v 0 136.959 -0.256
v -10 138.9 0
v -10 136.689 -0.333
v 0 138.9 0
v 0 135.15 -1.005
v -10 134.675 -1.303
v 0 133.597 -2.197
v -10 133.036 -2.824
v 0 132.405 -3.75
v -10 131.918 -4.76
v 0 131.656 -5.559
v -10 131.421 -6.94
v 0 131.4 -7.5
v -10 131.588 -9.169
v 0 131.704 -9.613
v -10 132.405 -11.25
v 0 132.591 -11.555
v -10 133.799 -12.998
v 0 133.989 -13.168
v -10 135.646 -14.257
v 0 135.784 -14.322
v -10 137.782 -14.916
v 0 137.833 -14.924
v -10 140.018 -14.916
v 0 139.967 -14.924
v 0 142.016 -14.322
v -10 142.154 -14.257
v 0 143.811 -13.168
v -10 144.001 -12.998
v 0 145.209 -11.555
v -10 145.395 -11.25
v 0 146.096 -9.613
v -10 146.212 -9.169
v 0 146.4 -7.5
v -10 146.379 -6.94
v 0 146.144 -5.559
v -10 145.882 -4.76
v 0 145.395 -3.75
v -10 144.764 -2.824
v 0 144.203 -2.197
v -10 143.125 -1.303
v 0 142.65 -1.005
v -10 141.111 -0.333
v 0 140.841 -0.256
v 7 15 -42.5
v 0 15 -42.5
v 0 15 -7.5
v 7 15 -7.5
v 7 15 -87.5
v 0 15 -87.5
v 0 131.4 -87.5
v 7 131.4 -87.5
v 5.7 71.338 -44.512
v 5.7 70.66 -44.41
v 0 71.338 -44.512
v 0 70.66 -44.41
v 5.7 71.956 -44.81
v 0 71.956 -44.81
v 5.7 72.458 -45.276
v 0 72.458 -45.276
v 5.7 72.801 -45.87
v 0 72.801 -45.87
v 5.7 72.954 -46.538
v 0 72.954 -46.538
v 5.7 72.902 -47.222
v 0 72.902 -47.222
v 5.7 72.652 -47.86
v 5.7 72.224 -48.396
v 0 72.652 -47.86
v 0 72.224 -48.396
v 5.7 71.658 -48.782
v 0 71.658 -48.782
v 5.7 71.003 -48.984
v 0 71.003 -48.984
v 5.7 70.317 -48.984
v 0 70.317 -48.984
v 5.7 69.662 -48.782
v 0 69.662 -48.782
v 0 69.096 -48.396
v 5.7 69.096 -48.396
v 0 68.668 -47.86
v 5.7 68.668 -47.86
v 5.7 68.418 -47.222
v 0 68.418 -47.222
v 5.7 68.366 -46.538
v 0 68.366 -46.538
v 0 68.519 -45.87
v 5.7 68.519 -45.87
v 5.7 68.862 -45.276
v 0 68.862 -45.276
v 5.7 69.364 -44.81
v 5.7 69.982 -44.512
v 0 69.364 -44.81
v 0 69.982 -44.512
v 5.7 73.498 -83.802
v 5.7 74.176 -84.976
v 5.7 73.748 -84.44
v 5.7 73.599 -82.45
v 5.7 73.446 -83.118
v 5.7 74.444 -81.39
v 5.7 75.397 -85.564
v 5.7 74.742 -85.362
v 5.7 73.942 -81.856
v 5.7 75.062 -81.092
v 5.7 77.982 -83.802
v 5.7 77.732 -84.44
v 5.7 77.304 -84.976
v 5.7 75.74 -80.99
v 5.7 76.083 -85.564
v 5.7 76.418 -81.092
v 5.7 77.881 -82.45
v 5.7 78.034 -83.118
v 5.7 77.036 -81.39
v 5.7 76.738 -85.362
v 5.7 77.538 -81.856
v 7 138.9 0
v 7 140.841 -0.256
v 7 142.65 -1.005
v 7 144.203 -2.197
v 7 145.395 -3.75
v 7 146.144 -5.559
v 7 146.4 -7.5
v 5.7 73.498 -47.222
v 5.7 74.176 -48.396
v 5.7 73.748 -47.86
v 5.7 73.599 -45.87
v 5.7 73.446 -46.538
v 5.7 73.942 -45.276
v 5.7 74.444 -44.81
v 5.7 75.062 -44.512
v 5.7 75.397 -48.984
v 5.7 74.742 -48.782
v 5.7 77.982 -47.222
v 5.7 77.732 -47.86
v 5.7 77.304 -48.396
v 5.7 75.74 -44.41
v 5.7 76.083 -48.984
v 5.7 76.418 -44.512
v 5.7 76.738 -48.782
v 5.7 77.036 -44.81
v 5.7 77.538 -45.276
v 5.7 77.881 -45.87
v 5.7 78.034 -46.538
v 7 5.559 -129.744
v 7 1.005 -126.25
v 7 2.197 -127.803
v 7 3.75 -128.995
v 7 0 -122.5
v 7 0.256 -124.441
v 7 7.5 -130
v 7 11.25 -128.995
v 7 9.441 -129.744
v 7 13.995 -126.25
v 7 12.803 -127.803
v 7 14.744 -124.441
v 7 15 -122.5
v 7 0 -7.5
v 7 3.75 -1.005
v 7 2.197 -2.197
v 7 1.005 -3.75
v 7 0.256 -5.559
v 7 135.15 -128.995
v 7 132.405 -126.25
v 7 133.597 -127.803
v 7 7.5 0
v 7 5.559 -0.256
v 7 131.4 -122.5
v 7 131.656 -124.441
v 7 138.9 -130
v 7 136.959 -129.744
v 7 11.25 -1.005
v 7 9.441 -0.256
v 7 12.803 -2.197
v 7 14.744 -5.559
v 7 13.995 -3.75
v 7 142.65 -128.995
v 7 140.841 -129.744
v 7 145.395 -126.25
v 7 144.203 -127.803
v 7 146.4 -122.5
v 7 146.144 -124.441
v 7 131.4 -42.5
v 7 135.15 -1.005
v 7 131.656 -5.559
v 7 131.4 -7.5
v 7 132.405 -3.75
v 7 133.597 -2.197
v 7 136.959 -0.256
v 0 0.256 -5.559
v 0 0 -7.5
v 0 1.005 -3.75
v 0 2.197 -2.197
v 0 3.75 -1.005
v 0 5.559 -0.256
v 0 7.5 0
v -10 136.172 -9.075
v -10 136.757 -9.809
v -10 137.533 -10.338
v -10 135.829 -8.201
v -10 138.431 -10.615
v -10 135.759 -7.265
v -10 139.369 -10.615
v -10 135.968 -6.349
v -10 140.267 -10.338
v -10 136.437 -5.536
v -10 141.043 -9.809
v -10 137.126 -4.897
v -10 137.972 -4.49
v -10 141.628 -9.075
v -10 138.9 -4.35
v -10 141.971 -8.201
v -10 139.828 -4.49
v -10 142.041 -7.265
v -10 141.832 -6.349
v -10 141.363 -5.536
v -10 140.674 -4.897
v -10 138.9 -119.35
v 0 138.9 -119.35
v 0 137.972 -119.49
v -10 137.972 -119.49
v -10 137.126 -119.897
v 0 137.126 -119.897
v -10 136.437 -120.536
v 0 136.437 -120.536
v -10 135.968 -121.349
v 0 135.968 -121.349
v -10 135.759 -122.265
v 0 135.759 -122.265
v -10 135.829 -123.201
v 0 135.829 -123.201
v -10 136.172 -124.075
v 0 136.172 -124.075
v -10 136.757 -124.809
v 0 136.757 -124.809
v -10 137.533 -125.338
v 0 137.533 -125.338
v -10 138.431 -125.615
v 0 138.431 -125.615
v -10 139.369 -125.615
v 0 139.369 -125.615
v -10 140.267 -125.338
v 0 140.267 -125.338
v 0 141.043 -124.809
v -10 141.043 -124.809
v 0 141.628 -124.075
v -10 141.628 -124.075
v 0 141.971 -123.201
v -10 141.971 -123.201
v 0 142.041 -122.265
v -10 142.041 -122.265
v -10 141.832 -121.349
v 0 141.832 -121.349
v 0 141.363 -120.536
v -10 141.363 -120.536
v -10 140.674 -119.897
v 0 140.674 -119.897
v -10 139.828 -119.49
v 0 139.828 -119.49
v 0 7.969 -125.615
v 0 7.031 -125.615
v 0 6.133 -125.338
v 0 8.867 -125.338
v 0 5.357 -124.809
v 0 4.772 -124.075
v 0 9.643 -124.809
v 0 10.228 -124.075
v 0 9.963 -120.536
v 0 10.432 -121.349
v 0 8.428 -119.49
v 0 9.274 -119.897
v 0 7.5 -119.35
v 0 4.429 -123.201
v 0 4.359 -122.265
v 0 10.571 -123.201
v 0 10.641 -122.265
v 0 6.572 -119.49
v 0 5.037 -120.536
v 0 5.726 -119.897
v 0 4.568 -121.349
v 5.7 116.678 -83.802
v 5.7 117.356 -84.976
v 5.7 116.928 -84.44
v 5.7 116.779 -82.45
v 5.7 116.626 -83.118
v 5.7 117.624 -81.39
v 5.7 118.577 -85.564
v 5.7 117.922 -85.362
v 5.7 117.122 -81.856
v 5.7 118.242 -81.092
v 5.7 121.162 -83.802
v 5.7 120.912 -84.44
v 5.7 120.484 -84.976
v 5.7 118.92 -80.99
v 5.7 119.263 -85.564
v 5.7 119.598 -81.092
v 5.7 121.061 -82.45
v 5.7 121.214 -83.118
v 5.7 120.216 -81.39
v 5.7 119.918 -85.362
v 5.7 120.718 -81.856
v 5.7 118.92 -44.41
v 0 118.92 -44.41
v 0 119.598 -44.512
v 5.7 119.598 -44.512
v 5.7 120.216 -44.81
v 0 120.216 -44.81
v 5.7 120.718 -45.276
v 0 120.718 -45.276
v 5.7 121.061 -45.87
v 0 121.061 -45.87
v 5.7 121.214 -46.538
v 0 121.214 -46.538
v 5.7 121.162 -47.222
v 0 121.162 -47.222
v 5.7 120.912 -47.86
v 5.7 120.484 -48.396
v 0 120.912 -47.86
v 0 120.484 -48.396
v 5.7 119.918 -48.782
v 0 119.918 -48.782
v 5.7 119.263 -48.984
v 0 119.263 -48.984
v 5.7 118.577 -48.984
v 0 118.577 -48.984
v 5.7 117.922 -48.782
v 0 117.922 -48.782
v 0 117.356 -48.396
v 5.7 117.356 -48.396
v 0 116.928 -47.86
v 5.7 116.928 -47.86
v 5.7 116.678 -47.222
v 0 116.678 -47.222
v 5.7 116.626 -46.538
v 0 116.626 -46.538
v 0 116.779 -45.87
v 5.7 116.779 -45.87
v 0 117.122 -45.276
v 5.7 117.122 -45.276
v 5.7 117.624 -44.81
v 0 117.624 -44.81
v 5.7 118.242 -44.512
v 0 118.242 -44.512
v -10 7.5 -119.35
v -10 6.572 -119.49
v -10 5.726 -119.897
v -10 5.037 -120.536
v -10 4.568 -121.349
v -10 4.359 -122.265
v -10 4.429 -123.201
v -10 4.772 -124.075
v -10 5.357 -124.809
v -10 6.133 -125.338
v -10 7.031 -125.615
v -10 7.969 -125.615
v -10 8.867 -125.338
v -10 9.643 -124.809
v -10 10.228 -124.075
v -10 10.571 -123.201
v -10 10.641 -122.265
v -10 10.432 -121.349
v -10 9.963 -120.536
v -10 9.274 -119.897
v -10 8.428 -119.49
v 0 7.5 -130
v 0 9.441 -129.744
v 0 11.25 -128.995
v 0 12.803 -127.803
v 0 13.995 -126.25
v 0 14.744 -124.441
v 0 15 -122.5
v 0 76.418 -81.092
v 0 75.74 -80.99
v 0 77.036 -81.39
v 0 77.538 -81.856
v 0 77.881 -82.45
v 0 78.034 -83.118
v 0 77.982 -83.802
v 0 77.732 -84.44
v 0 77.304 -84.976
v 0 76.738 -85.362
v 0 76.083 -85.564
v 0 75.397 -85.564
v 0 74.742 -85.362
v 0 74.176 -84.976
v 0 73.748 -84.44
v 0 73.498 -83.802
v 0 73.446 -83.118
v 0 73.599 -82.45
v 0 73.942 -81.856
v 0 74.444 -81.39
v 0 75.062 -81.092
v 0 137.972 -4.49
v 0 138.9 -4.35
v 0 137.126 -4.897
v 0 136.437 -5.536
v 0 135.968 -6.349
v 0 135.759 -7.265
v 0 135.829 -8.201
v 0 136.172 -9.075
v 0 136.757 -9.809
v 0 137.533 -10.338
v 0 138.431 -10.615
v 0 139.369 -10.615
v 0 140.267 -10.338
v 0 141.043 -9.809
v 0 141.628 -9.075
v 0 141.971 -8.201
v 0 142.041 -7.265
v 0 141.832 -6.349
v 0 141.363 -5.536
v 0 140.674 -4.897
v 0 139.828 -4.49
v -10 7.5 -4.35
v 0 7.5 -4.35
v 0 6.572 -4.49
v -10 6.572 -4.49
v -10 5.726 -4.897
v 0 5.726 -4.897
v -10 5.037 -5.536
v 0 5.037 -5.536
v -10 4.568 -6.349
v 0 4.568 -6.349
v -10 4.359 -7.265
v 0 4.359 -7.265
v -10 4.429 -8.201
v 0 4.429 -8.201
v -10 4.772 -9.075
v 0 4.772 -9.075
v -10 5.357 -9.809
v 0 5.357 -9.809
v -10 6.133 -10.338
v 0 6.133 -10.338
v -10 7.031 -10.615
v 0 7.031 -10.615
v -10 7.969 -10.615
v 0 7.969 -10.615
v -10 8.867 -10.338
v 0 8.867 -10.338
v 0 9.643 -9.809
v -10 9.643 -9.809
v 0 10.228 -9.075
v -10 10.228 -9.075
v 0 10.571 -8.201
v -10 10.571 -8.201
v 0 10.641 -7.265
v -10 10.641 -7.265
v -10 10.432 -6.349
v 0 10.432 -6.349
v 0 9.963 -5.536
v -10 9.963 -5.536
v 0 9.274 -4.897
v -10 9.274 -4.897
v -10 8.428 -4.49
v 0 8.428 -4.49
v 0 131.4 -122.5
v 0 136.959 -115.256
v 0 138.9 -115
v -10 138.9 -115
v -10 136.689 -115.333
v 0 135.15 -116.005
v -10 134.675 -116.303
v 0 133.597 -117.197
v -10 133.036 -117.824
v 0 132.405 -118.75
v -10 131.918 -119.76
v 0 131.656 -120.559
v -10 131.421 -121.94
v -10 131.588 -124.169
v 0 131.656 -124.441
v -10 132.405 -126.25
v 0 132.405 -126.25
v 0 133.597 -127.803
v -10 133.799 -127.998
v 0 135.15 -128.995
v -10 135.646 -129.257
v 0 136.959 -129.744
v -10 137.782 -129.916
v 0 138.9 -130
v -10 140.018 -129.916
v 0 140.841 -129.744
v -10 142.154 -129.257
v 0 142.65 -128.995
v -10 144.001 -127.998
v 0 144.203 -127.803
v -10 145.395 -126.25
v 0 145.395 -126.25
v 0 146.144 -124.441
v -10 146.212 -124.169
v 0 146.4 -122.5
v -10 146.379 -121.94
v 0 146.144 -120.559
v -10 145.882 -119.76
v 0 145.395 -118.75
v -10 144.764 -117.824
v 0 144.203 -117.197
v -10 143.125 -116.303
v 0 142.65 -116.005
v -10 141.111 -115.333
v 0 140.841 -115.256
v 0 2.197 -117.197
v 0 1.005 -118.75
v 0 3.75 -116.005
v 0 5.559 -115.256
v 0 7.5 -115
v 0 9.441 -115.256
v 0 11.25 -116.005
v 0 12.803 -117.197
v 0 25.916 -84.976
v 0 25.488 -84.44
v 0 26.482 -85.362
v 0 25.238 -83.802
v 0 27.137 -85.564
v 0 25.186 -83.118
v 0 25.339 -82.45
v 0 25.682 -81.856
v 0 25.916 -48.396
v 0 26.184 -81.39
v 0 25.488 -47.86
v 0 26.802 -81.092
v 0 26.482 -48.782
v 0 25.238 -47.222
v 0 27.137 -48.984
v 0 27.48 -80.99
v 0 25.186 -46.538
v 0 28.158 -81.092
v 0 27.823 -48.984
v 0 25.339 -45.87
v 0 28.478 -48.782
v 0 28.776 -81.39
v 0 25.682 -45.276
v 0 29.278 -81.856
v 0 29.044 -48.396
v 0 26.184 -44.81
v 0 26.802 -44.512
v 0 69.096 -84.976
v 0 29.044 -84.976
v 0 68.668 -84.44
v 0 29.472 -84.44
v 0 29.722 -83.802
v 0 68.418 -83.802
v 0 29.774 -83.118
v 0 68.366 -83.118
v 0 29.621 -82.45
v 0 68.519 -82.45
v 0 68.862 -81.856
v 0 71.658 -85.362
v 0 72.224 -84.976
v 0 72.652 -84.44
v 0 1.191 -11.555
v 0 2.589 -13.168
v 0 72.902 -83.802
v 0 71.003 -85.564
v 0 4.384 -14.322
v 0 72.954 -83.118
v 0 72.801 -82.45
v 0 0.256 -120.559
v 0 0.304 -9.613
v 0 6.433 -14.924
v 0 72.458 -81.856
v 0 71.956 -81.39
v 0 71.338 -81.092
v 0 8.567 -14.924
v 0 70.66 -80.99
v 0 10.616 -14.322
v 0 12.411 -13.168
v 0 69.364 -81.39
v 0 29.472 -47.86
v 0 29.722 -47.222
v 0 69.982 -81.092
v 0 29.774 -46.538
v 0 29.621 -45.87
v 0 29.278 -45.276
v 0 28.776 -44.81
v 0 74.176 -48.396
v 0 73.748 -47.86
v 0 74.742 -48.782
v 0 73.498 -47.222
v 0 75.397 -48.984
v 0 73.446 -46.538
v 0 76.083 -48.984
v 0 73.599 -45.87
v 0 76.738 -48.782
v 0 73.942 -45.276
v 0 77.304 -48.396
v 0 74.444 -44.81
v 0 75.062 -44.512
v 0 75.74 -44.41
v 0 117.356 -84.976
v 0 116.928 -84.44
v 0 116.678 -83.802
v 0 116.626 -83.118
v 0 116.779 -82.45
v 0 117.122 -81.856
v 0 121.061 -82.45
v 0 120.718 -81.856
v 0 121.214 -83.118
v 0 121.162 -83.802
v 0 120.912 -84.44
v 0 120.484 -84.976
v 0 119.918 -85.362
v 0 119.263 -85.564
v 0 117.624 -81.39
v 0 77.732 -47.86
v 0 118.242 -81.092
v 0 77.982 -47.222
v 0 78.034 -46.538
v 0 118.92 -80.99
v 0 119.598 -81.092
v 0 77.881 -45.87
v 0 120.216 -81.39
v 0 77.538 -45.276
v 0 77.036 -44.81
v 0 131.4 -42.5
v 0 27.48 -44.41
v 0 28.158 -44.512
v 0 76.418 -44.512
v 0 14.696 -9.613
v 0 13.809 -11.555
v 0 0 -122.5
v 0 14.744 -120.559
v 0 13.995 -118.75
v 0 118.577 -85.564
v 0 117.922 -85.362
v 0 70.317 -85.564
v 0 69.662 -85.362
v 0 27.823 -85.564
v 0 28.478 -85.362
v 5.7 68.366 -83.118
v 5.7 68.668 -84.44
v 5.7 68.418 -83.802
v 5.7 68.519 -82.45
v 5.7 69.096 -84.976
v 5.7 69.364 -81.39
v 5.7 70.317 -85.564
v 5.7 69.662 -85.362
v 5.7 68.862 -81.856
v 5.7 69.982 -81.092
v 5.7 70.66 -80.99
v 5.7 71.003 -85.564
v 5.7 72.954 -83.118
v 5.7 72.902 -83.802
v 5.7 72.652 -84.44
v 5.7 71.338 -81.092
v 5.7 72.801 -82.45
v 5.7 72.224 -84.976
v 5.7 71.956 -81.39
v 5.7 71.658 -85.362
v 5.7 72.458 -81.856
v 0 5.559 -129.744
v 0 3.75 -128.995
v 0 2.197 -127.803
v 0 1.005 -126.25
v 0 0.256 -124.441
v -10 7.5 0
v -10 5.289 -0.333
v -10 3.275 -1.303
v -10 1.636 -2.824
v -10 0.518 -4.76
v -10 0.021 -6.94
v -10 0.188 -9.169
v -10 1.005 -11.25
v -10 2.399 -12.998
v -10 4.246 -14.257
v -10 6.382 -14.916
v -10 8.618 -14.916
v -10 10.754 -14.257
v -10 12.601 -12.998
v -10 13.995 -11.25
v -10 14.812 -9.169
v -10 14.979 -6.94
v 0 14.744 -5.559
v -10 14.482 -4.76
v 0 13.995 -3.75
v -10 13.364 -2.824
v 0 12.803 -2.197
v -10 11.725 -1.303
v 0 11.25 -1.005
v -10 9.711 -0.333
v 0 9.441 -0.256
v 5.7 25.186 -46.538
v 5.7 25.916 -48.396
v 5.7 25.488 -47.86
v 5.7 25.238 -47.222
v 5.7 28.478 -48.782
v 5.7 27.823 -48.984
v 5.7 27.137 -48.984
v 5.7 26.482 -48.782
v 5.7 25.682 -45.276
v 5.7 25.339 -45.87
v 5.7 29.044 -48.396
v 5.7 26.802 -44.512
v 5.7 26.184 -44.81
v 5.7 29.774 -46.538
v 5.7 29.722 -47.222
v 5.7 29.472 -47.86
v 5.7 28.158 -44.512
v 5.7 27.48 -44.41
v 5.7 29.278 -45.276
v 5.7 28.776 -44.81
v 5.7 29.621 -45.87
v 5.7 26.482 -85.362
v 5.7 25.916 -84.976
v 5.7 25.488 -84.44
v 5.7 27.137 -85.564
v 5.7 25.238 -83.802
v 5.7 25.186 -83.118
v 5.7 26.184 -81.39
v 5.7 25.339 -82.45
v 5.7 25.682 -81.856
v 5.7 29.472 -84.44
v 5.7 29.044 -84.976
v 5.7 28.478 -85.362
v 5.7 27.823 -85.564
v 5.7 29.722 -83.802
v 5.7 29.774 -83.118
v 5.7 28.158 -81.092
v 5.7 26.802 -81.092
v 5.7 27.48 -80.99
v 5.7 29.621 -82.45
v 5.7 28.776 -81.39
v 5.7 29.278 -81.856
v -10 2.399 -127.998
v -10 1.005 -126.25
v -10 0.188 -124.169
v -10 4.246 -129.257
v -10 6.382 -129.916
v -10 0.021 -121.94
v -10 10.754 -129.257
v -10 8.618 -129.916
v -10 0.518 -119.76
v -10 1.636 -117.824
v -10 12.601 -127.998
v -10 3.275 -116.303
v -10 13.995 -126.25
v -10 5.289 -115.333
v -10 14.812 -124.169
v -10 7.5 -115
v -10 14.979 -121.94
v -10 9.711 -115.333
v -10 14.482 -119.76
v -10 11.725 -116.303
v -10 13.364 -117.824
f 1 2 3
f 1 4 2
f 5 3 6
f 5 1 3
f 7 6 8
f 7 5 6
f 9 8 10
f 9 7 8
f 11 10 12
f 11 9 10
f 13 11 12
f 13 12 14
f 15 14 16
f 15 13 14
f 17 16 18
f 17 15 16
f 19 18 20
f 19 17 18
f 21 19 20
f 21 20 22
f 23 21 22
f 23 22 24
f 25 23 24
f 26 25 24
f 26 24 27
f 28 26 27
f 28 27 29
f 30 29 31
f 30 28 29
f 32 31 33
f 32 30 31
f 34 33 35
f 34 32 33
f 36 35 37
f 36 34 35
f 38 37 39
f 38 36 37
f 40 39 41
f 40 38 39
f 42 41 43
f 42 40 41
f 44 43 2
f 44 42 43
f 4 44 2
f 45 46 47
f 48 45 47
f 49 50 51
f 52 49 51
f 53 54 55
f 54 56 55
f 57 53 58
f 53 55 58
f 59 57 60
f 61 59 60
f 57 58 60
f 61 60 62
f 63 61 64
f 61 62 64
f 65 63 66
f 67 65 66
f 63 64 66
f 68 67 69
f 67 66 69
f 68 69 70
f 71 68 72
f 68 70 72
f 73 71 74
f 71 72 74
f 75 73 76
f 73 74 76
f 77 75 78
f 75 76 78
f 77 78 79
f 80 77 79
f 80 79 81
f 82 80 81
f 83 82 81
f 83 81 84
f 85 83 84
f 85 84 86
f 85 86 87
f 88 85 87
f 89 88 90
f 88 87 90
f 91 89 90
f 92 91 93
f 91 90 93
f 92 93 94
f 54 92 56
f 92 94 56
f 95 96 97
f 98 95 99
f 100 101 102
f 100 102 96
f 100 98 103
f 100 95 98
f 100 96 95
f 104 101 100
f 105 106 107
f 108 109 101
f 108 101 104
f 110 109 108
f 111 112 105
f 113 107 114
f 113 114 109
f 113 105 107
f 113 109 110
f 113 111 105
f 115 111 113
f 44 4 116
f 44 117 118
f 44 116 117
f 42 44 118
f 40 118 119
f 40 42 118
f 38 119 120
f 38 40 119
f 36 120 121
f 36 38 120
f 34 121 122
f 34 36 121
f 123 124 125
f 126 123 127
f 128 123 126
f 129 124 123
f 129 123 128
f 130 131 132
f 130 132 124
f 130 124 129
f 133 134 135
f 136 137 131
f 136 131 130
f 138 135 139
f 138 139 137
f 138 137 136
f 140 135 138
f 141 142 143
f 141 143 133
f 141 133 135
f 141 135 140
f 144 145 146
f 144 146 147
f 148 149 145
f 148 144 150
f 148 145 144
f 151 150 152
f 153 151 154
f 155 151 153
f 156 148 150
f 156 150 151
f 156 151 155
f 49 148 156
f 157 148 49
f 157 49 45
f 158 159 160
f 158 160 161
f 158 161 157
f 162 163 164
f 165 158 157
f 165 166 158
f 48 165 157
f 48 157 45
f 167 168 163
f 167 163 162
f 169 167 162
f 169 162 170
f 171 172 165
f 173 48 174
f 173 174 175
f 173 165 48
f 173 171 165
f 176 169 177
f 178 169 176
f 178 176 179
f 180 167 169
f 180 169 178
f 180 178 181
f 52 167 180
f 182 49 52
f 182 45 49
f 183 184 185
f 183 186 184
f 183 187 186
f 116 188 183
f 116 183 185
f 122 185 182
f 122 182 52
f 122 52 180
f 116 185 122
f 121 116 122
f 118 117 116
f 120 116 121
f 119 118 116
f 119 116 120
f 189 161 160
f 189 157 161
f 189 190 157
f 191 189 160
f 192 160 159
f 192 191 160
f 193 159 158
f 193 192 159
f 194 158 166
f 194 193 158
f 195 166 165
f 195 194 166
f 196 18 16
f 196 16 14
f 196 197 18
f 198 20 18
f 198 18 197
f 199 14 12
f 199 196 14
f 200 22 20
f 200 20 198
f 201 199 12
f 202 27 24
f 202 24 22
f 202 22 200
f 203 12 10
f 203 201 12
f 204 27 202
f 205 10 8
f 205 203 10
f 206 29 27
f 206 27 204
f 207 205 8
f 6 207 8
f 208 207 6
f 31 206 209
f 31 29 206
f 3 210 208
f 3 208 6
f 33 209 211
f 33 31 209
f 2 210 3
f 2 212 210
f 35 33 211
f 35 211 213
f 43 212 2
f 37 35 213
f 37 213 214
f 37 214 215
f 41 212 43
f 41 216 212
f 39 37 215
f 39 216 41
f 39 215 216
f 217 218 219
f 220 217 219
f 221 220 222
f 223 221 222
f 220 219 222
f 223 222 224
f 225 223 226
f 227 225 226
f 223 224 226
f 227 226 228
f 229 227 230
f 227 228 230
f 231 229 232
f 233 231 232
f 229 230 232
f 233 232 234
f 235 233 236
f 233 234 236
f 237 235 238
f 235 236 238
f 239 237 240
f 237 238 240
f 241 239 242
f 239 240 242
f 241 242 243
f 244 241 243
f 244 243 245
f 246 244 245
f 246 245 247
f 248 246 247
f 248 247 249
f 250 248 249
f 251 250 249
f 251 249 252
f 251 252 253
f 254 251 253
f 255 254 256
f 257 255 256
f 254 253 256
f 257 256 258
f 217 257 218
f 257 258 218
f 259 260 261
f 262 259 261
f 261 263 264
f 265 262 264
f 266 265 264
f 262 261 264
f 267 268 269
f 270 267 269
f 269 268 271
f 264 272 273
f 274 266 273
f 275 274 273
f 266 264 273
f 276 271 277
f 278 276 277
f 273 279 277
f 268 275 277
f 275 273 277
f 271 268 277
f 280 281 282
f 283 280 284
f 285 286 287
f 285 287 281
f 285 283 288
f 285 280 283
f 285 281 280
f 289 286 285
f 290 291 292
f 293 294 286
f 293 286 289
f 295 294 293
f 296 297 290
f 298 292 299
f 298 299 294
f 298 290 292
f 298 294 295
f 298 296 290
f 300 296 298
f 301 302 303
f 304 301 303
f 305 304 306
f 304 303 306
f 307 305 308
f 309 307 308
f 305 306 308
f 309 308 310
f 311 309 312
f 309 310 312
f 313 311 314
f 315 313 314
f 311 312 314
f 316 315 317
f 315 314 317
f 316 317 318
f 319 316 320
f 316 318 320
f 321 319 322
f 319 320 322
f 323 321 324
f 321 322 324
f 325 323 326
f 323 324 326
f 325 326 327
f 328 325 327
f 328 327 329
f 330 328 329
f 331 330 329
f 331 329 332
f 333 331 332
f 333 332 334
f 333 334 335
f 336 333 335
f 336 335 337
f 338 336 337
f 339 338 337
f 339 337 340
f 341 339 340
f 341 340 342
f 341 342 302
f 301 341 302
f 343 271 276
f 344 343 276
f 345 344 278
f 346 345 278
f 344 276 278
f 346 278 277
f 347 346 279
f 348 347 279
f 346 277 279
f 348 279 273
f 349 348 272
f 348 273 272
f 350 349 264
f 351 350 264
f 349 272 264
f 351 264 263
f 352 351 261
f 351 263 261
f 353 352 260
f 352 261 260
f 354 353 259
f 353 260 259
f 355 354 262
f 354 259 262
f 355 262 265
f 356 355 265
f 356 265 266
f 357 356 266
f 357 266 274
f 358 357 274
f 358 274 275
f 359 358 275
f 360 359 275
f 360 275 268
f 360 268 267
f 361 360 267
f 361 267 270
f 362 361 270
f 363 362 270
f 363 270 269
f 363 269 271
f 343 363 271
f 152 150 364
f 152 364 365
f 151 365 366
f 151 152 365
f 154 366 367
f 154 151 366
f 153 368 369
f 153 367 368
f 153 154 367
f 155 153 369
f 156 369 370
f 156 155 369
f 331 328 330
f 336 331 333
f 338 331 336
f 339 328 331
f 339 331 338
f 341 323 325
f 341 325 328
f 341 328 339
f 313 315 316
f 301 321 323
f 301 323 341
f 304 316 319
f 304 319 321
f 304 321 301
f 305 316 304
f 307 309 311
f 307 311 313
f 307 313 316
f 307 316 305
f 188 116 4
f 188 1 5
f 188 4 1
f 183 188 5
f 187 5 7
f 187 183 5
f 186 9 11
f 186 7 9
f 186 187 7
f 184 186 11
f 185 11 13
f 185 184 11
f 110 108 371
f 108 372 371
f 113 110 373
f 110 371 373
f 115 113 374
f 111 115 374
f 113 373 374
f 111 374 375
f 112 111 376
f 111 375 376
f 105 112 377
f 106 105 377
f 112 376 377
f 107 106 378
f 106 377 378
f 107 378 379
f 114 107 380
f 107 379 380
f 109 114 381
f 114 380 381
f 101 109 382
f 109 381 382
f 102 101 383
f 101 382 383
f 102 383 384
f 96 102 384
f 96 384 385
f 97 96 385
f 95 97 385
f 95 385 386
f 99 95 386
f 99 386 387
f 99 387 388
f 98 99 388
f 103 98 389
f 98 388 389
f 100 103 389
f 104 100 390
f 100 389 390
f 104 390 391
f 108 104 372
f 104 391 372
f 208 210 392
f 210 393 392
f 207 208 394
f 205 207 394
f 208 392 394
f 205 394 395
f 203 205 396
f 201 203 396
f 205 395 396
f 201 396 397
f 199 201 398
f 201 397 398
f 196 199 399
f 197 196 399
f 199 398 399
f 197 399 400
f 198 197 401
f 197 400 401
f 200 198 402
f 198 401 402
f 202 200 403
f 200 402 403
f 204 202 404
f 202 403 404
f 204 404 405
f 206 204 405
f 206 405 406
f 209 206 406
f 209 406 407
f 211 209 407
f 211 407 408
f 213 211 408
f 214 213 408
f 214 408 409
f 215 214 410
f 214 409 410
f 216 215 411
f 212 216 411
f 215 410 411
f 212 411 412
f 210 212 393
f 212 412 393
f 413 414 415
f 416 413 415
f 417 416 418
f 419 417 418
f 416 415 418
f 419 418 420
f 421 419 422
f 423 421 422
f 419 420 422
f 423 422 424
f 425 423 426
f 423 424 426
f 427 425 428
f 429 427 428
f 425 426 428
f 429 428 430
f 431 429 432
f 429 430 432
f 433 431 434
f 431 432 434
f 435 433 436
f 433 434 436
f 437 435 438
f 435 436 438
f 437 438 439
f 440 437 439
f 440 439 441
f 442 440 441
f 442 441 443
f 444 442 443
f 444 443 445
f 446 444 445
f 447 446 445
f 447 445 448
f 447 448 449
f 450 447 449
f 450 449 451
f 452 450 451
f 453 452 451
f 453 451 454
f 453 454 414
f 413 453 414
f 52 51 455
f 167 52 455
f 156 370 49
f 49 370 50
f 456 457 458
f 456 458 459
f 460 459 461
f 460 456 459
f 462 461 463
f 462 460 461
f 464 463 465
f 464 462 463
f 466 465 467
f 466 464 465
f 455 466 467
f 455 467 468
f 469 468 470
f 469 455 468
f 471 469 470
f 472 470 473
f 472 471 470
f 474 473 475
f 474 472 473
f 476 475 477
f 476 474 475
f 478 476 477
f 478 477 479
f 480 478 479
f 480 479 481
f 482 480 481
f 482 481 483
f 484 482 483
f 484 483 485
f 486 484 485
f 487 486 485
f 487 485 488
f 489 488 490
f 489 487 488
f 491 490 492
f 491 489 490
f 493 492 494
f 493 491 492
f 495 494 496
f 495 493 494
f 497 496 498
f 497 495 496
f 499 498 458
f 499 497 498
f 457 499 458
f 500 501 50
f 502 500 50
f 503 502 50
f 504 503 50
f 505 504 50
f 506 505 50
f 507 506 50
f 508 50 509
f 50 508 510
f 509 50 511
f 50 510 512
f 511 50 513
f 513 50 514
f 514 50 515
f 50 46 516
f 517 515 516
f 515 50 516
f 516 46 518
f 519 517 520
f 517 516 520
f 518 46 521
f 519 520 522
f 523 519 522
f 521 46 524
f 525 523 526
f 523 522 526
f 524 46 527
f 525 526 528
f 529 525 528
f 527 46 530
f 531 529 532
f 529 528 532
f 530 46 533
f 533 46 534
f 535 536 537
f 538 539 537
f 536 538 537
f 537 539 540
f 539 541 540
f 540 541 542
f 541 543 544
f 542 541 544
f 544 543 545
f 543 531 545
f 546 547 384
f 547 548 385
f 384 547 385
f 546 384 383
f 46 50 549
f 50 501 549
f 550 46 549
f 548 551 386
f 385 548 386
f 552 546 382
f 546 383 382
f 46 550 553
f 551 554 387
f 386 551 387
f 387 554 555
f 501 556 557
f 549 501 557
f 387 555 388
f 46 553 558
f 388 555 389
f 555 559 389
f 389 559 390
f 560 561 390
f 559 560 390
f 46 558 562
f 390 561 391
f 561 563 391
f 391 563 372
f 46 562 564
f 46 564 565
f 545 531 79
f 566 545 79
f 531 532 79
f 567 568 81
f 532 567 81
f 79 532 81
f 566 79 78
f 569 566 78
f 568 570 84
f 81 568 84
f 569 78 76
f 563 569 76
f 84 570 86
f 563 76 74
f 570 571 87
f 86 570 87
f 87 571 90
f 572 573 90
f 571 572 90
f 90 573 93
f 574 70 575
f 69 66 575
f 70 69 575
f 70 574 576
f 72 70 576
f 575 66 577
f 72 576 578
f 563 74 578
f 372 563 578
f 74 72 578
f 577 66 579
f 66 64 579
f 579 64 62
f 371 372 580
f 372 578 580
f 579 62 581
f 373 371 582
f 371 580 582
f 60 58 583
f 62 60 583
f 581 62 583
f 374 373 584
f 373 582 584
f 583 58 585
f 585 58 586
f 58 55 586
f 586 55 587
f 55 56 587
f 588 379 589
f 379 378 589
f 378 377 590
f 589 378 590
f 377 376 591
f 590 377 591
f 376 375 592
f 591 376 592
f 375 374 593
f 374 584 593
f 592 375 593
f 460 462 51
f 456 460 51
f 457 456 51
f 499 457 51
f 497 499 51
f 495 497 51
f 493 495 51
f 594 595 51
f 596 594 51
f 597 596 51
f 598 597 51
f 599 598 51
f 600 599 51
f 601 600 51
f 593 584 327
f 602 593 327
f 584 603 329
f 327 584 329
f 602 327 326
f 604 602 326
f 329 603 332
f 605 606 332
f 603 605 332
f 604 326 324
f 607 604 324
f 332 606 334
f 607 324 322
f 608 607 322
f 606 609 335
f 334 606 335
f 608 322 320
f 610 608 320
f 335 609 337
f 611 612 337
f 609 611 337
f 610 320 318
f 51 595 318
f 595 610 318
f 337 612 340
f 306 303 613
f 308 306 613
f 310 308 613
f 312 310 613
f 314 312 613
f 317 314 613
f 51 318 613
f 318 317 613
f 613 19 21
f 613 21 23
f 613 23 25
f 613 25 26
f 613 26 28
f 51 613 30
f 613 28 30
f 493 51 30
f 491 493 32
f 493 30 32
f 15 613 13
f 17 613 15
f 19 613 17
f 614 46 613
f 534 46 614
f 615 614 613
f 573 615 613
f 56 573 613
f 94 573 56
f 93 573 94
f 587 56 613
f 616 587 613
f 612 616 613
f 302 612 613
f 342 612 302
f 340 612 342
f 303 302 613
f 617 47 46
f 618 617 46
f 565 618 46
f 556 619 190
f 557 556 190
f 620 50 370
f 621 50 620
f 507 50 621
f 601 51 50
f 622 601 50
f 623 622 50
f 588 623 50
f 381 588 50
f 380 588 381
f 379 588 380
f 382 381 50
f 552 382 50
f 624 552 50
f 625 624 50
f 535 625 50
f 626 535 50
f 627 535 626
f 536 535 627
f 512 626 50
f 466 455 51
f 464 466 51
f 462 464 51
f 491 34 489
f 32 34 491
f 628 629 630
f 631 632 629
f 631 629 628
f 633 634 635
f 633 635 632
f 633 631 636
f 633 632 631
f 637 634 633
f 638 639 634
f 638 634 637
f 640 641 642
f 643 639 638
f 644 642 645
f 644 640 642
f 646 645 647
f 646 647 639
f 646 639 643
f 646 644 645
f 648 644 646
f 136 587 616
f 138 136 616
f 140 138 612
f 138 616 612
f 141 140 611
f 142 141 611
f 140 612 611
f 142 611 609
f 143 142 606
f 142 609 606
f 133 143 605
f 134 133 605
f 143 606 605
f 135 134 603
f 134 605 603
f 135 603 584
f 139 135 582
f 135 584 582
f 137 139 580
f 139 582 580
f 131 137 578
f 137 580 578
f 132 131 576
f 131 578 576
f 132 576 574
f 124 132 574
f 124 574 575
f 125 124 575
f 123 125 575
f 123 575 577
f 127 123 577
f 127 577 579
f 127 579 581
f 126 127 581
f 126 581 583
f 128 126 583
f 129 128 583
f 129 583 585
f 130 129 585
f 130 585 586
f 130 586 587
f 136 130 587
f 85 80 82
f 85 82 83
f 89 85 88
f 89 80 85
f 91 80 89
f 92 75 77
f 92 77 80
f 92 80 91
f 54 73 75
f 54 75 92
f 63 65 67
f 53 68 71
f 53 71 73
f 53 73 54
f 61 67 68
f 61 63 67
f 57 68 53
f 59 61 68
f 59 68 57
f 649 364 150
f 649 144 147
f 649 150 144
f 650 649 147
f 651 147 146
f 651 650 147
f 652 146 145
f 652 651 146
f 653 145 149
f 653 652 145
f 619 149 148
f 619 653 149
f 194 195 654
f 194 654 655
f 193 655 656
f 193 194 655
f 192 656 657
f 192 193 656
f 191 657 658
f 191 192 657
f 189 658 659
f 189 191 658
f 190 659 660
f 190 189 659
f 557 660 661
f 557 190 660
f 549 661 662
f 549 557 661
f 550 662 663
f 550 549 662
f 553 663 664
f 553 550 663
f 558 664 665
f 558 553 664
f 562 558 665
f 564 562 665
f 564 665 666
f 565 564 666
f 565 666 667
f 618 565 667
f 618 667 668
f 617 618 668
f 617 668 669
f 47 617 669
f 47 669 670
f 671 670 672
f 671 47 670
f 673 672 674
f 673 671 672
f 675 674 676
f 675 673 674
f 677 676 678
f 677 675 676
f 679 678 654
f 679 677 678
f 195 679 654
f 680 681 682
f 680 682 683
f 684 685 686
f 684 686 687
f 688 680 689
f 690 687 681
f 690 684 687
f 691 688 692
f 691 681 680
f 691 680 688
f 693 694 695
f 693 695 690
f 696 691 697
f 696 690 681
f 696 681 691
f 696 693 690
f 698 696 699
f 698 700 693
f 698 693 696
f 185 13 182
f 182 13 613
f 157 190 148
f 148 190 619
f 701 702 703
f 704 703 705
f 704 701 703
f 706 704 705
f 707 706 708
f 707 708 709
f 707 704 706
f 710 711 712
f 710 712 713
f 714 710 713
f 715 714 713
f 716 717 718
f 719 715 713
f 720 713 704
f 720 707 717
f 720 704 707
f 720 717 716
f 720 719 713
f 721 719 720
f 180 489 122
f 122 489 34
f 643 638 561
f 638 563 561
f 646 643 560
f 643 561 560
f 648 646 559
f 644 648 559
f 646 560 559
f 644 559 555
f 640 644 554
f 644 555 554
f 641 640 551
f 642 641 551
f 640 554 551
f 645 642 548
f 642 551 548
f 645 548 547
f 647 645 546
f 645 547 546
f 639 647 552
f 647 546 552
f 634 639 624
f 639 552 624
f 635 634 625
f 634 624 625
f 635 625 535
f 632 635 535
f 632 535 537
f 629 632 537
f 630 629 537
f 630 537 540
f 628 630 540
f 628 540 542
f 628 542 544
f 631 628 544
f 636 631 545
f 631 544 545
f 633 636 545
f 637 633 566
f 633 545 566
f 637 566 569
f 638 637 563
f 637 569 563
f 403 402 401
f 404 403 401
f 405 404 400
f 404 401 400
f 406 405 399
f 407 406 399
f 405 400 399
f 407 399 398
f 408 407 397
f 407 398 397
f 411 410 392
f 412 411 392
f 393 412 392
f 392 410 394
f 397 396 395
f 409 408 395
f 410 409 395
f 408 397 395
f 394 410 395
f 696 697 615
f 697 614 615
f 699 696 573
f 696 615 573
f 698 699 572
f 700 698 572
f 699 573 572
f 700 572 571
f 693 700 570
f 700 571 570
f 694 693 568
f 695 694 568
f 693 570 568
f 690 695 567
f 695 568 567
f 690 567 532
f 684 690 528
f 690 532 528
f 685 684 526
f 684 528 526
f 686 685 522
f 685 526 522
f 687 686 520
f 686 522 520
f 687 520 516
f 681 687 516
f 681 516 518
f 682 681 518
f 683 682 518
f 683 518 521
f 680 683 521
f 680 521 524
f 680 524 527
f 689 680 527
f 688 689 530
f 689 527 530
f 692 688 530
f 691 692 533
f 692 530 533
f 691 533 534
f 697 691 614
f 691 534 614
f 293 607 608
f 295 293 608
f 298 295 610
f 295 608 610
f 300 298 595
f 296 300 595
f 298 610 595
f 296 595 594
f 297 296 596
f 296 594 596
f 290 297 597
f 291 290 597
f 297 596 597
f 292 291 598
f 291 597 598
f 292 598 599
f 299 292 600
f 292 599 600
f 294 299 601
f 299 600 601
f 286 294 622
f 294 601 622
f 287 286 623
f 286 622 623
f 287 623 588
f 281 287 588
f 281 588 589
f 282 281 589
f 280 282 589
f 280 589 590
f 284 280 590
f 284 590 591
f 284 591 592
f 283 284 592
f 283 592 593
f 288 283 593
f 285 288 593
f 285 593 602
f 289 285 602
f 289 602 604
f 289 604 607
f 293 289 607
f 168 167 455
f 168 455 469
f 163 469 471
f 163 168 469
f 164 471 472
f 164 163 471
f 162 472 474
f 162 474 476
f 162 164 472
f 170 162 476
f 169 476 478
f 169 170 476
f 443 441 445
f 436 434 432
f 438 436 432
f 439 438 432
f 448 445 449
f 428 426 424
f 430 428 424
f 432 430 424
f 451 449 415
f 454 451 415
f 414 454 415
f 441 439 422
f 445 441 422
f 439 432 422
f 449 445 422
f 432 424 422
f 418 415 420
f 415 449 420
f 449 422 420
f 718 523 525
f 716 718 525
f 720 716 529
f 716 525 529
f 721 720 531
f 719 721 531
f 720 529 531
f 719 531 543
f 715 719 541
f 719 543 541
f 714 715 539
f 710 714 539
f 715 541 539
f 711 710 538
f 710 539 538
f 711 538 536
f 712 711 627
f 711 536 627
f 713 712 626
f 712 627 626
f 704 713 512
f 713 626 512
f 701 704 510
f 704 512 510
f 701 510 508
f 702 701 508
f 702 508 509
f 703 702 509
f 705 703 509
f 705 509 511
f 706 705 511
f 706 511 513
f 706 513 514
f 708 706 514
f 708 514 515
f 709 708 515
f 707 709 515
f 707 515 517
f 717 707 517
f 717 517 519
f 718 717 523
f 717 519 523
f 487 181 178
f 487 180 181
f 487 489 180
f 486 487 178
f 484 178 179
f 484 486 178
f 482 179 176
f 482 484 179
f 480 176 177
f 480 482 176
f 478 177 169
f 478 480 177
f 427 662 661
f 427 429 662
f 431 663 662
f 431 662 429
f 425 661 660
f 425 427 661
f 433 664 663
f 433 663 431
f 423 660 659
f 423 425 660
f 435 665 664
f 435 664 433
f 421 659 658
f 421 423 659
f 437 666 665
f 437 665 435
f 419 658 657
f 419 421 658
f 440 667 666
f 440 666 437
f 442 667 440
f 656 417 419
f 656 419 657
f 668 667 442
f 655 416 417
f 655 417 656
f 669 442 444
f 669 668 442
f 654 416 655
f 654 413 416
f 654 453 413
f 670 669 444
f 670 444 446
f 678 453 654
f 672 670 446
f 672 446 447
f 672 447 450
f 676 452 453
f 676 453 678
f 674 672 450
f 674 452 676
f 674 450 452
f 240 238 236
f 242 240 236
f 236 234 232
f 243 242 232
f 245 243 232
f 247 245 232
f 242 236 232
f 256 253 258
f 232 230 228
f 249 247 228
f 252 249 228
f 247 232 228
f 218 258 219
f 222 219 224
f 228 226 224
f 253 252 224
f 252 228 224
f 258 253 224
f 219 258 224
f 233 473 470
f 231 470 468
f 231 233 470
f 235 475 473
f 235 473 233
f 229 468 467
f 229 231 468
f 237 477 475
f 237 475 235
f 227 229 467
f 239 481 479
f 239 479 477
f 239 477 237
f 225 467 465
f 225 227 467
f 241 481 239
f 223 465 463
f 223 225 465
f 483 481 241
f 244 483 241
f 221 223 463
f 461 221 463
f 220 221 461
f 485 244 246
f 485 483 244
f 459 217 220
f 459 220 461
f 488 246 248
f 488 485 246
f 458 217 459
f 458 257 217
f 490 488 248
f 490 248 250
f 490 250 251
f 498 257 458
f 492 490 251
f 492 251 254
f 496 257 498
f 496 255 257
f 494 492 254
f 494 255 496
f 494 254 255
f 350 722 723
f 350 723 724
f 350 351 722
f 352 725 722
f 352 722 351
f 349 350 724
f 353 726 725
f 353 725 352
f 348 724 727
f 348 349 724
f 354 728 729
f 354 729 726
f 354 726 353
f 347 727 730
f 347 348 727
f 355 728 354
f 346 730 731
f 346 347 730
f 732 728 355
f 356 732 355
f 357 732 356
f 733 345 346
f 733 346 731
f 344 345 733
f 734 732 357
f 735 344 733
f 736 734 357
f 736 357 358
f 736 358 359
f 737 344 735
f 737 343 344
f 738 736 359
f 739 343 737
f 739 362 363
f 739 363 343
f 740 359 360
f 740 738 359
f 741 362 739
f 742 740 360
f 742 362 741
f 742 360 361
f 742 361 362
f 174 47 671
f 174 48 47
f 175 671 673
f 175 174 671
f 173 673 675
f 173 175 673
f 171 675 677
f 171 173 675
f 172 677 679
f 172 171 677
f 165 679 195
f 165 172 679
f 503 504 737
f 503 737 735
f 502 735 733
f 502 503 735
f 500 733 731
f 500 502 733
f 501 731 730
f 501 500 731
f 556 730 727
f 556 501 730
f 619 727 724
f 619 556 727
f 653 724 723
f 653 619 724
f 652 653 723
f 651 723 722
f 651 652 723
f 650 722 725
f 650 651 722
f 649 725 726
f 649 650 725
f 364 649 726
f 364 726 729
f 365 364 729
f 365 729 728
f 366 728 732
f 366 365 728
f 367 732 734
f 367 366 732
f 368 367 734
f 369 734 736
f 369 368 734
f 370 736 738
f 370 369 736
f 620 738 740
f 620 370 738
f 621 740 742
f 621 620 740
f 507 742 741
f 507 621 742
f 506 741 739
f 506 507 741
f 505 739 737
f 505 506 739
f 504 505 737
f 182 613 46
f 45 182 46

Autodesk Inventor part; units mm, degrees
ref_plane "YZ Plane" through (0, 0, 0) normal (1, 0, 0) x (0, 1, 0)
ref_plane "XZ Plane" through (0, 0, 0) normal (0, 1, 0) x (-1, 0, 0)
ref_plane "XY Plane" through (0, 0, 0) normal (0, 0, 1) x (1, 0, 0)
sketch "Esquisse1" plane through (0, 0, 0) normal (1, 0, 0) x (0, 1, 0)
  line L0 (7.5, 0) -> (138.9, 0)
  line L1 (146.4, -7.5) -> (146.4, -122.5)
  line L2 (138.9, -130) -> (7.5, -130)
  line L3 (0, -122.5) -> (0, -7.5)
  arc A0 (138.9, -130) -> (146.4, -122.5) centre (138.9, -122.5) ccw
  arc A1 (0, -122.5) -> (7.5, -130) centre (7.5, -122.5) ccw
  arc A2 (7.5, 0) -> (0, -7.5) centre (7.5, -7.5) ccw
  arc A3 (146.4, -7.5) -> (138.9, 0) centre (138.9, -7.5) ccw
  line L4 (15, -42.5) -> (131.4, -42.5)
  line L5 (131.4, -42.5) -> (131.4, -87.5)
  line L6 (131.4, -87.5) -> (15, -87.5)
  line L7 (15, -87.5) -> (15, -42.5)
  circle A4 centre (138.9, -122.5) radius 7.5
  line L8 (15, -42.5) -> (15, 0)
  line L9 (15, -87.5) -> (15, -130)
  line L10 (131.4, -87.5) -> (131.4, -130)
  line L11 (131.4, -42.5) -> (131.4, 0)
  circle A5 centre (7.5, -122.5) radius 7.5
  circle A6 centre (138.9, -7.5) radius 7.5
  circle A7 centre (7.5, -7.5) radius 7.5
  point P0 (0, 0)
  point P1 (146.4, -130)
  point P2 (146.4, 0)
  point P3 (0, -130)
  point P4 (73.2, -87.5)
  dimension "d0" = 146.4
  dimension "d1" = 130
  dimension "d2" = 7.5
  dimension "d3" = 7.5
  dimension "d4" = 116.4
  dimension "d5" = 45
  dimension "d11" = 42.5
  dimension "d12" = 42.5
  dimension "d13" = 15
  dimension "d104" = 131.4
  dimension "d107" = 115
sketch "Esquisse1 outline for Extrusion1" plane through (0, 0, 0) normal (1, 0, 0) x (0, 1, 0)
  line L0 (15, -87.5) -> (131.4, -87.5)
  line L1 (15, -130) -> (15, -87.5)
  line L2 (7.5, -130) -> (15, -130)
  arc A0 (0, -122.5) -> (7.5, -130) centre (7.5, -122.5) ccw
  line L3 (0, -7.5) -> (0, -122.5)
  arc A1 (7.5, 0) -> (0, -7.5) centre (7.5, -7.5) ccw
  line L4 (15, 0) -> (7.5, 0)
  line L5 (15, -42.5) -> (15, 0)
  line L6 (131.4, -42.5) -> (15, -42.5)
  line L7 (131.4, 0) -> (131.4, -42.5)
  line L8 (138.9, 0) -> (131.4, 0)
  arc A2 (146.4, -7.5) -> (138.9, 0) centre (138.9, -7.5) ccw
  line L9 (146.4, -122.5) -> (146.4, -7.5)
  arc A3 (138.9, -130) -> (146.4, -122.5) centre (138.9, -122.5) ccw
  line L10 (131.4, -130) -> (138.9, -130)
  line L11 (131.4, -87.5) -> (131.4, -130)
extrude "Extrusion1" add sketch "Esquisse1 outline for Extrusion1" along normal blind 7
sketch "Esquisse2" plane through (0, 0, 0) normal (-1, 0, 0) x (0, 0, 1)
  line L0 (-46.71, 27.48) -> (-83.29, 27.48)
  line L1 (-83.29, 27.48) -> (-83.29, 70.66)
  line L2 (-83.29, 70.66) -> (-46.71, 70.66)
  line L3 (-46.71, 70.66) -> (-46.71, 27.48)
  line L4 (-46.71, 75.74) -> (-83.29, 75.74)
  line L5 (-83.29, 75.74) -> (-83.29, 118.92)
  line L6 (-83.29, 118.92) -> (-46.71, 118.92)
  line L7 (-46.71, 118.92) -> (-46.71, 75.74)
  line L8 (-42.5, 131.4) -> (-42.5, 15) projected
  line L9 (-87.5, 15) -> (-87.5, 131.4) projected
  circle A0 centre (-83.29, 27.48) radius 2.3
  circle A1 centre (-46.71, 27.48) radius 2.3
  circle A2 centre (-46.71, 70.66) radius 2.3
  circle A3 centre (-83.29, 70.66) radius 2.3
  circle A4 centre (-83.29, 75.74) radius 2.3
  circle A5 centre (-46.71, 75.74) radius 2.3
  circle A6 centre (-46.71, 118.92) radius 2.3
  circle A7 centre (-83.29, 118.92) radius 2.3
  line L10 (-7.5, 0) -> (-122.5, 0) projected
  line L11 (-122.5, 146.4) -> (-7.5, 146.4) projected
  point P0 (0, 0)
  point P1 (-83.29, 49.07)
  dimension "d8" = 36.58
  dimension "d9" = 43.18
  dimension "d10" = 43.18
  dimension "d14" = 4.21
  dimension "d15" = 4.21
  dimension "d16" = 5.08
  dimension "d17" = 4.6
  dimension "d18" = 4.6
  dimension "d19" = 4.6
  dimension "d20" = 4.6
  dimension "d21" = 4.6
  dimension "d22" = 4.6
  dimension "d23" = 4.6
  dimension "d24" = 4.6
  dimension "d110" = 27.48
  dimension "d111" = 27.48
sketch "Esquisse2 outline for Extrusion2" plane through (0, 0, 0) normal (-1, 0, 0) x (0, 0, 1)
  circle A0 centre (-46.71, 118.92) radius 2.3
  circle A1 centre (-83.29, 118.92) radius 2.3
  circle A2 centre (-83.29, 75.74) radius 2.3
  circle A3 centre (-46.71, 75.74) radius 2.3
  circle A4 centre (-83.29, 70.66) radius 2.3
  circle A5 centre (-46.71, 70.66) radius 2.3
  circle A6 centre (-46.71, 27.48) radius 2.3
  circle A7 centre (-83.29, 27.48) radius 2.3
extrude "Extrusion2" cut sketch "Esquisse2 outline for Extrusion2" against normal blind 5.7
sketch "Esquisse3" plane through (0, 0, 0) normal (-1, 0, 0) x (0, 0, 1)
  arc A0 (-7.5, 0) -> (0, 7.5) centre (-7.5, 7.5) ccw projected
  circle A1 centre (-7.5, 7.5) radius 7.5
  arc A2 (-130, 7.5) -> (-122.5, 0) centre (-122.5, 7.5) ccw projected
  circle A3 centre (-122.5, 7.5) radius 7.5
  arc A4 (-122.5, 146.4) -> (-130, 138.9) centre (-122.5, 138.9) ccw projected
  circle A5 centre (-122.5, 138.9) radius 7.5
  arc A6 (0, 138.9) -> (-7.5, 146.4) centre (-7.5, 138.9) ccw projected
  circle A7 centre (-7.5, 138.9) radius 7.5
  point P0 (0, 0)
  point P1 (-7.5, 0)
  point P2 (-7.5, 146.4)
  point P3 (-130, 7.5)
sketch "Esquisse3 outline for Extrusion3" plane through (0, 0, 0) normal (-1, 0, 0) x (0, 0, 1)
  circle A0 centre (-7.5, 7.5) radius 7.5
  circle A1 centre (-7.5, 138.9) radius 7.5
  circle A2 centre (-122.5, 7.5) radius 7.5
  circle A3 centre (-122.5, 138.9) radius 7.5
extrude "Extrusion3" add sketch "Esquisse3 outline for Extrusion3" along normal blind 10
fillet "Congé1" radius 7.5 4 edges at (3.5, 131.4, 0) (3.5, 15, 0) (3.5, 131.4, -130) (3.5, 15, -130)
hole "Perçage5" at (-10, 7.5, -7.5) direction (1, 0, 0) diameter 6.3 depth 10
hole "Perçage6" at (-10, 138.9, -7.5) direction (1, 0, 0) diameter 6.3 depth 10
hole "Perçage7" at (-10, 138.9, -122.5) direction (1, 0, 0) diameter 6.3 depth 10
hole "Perçage8" at (-10, 7.5, -122.5) direction (1, 0, 0) diameter 6.3 depth 10
properties part number "base"
